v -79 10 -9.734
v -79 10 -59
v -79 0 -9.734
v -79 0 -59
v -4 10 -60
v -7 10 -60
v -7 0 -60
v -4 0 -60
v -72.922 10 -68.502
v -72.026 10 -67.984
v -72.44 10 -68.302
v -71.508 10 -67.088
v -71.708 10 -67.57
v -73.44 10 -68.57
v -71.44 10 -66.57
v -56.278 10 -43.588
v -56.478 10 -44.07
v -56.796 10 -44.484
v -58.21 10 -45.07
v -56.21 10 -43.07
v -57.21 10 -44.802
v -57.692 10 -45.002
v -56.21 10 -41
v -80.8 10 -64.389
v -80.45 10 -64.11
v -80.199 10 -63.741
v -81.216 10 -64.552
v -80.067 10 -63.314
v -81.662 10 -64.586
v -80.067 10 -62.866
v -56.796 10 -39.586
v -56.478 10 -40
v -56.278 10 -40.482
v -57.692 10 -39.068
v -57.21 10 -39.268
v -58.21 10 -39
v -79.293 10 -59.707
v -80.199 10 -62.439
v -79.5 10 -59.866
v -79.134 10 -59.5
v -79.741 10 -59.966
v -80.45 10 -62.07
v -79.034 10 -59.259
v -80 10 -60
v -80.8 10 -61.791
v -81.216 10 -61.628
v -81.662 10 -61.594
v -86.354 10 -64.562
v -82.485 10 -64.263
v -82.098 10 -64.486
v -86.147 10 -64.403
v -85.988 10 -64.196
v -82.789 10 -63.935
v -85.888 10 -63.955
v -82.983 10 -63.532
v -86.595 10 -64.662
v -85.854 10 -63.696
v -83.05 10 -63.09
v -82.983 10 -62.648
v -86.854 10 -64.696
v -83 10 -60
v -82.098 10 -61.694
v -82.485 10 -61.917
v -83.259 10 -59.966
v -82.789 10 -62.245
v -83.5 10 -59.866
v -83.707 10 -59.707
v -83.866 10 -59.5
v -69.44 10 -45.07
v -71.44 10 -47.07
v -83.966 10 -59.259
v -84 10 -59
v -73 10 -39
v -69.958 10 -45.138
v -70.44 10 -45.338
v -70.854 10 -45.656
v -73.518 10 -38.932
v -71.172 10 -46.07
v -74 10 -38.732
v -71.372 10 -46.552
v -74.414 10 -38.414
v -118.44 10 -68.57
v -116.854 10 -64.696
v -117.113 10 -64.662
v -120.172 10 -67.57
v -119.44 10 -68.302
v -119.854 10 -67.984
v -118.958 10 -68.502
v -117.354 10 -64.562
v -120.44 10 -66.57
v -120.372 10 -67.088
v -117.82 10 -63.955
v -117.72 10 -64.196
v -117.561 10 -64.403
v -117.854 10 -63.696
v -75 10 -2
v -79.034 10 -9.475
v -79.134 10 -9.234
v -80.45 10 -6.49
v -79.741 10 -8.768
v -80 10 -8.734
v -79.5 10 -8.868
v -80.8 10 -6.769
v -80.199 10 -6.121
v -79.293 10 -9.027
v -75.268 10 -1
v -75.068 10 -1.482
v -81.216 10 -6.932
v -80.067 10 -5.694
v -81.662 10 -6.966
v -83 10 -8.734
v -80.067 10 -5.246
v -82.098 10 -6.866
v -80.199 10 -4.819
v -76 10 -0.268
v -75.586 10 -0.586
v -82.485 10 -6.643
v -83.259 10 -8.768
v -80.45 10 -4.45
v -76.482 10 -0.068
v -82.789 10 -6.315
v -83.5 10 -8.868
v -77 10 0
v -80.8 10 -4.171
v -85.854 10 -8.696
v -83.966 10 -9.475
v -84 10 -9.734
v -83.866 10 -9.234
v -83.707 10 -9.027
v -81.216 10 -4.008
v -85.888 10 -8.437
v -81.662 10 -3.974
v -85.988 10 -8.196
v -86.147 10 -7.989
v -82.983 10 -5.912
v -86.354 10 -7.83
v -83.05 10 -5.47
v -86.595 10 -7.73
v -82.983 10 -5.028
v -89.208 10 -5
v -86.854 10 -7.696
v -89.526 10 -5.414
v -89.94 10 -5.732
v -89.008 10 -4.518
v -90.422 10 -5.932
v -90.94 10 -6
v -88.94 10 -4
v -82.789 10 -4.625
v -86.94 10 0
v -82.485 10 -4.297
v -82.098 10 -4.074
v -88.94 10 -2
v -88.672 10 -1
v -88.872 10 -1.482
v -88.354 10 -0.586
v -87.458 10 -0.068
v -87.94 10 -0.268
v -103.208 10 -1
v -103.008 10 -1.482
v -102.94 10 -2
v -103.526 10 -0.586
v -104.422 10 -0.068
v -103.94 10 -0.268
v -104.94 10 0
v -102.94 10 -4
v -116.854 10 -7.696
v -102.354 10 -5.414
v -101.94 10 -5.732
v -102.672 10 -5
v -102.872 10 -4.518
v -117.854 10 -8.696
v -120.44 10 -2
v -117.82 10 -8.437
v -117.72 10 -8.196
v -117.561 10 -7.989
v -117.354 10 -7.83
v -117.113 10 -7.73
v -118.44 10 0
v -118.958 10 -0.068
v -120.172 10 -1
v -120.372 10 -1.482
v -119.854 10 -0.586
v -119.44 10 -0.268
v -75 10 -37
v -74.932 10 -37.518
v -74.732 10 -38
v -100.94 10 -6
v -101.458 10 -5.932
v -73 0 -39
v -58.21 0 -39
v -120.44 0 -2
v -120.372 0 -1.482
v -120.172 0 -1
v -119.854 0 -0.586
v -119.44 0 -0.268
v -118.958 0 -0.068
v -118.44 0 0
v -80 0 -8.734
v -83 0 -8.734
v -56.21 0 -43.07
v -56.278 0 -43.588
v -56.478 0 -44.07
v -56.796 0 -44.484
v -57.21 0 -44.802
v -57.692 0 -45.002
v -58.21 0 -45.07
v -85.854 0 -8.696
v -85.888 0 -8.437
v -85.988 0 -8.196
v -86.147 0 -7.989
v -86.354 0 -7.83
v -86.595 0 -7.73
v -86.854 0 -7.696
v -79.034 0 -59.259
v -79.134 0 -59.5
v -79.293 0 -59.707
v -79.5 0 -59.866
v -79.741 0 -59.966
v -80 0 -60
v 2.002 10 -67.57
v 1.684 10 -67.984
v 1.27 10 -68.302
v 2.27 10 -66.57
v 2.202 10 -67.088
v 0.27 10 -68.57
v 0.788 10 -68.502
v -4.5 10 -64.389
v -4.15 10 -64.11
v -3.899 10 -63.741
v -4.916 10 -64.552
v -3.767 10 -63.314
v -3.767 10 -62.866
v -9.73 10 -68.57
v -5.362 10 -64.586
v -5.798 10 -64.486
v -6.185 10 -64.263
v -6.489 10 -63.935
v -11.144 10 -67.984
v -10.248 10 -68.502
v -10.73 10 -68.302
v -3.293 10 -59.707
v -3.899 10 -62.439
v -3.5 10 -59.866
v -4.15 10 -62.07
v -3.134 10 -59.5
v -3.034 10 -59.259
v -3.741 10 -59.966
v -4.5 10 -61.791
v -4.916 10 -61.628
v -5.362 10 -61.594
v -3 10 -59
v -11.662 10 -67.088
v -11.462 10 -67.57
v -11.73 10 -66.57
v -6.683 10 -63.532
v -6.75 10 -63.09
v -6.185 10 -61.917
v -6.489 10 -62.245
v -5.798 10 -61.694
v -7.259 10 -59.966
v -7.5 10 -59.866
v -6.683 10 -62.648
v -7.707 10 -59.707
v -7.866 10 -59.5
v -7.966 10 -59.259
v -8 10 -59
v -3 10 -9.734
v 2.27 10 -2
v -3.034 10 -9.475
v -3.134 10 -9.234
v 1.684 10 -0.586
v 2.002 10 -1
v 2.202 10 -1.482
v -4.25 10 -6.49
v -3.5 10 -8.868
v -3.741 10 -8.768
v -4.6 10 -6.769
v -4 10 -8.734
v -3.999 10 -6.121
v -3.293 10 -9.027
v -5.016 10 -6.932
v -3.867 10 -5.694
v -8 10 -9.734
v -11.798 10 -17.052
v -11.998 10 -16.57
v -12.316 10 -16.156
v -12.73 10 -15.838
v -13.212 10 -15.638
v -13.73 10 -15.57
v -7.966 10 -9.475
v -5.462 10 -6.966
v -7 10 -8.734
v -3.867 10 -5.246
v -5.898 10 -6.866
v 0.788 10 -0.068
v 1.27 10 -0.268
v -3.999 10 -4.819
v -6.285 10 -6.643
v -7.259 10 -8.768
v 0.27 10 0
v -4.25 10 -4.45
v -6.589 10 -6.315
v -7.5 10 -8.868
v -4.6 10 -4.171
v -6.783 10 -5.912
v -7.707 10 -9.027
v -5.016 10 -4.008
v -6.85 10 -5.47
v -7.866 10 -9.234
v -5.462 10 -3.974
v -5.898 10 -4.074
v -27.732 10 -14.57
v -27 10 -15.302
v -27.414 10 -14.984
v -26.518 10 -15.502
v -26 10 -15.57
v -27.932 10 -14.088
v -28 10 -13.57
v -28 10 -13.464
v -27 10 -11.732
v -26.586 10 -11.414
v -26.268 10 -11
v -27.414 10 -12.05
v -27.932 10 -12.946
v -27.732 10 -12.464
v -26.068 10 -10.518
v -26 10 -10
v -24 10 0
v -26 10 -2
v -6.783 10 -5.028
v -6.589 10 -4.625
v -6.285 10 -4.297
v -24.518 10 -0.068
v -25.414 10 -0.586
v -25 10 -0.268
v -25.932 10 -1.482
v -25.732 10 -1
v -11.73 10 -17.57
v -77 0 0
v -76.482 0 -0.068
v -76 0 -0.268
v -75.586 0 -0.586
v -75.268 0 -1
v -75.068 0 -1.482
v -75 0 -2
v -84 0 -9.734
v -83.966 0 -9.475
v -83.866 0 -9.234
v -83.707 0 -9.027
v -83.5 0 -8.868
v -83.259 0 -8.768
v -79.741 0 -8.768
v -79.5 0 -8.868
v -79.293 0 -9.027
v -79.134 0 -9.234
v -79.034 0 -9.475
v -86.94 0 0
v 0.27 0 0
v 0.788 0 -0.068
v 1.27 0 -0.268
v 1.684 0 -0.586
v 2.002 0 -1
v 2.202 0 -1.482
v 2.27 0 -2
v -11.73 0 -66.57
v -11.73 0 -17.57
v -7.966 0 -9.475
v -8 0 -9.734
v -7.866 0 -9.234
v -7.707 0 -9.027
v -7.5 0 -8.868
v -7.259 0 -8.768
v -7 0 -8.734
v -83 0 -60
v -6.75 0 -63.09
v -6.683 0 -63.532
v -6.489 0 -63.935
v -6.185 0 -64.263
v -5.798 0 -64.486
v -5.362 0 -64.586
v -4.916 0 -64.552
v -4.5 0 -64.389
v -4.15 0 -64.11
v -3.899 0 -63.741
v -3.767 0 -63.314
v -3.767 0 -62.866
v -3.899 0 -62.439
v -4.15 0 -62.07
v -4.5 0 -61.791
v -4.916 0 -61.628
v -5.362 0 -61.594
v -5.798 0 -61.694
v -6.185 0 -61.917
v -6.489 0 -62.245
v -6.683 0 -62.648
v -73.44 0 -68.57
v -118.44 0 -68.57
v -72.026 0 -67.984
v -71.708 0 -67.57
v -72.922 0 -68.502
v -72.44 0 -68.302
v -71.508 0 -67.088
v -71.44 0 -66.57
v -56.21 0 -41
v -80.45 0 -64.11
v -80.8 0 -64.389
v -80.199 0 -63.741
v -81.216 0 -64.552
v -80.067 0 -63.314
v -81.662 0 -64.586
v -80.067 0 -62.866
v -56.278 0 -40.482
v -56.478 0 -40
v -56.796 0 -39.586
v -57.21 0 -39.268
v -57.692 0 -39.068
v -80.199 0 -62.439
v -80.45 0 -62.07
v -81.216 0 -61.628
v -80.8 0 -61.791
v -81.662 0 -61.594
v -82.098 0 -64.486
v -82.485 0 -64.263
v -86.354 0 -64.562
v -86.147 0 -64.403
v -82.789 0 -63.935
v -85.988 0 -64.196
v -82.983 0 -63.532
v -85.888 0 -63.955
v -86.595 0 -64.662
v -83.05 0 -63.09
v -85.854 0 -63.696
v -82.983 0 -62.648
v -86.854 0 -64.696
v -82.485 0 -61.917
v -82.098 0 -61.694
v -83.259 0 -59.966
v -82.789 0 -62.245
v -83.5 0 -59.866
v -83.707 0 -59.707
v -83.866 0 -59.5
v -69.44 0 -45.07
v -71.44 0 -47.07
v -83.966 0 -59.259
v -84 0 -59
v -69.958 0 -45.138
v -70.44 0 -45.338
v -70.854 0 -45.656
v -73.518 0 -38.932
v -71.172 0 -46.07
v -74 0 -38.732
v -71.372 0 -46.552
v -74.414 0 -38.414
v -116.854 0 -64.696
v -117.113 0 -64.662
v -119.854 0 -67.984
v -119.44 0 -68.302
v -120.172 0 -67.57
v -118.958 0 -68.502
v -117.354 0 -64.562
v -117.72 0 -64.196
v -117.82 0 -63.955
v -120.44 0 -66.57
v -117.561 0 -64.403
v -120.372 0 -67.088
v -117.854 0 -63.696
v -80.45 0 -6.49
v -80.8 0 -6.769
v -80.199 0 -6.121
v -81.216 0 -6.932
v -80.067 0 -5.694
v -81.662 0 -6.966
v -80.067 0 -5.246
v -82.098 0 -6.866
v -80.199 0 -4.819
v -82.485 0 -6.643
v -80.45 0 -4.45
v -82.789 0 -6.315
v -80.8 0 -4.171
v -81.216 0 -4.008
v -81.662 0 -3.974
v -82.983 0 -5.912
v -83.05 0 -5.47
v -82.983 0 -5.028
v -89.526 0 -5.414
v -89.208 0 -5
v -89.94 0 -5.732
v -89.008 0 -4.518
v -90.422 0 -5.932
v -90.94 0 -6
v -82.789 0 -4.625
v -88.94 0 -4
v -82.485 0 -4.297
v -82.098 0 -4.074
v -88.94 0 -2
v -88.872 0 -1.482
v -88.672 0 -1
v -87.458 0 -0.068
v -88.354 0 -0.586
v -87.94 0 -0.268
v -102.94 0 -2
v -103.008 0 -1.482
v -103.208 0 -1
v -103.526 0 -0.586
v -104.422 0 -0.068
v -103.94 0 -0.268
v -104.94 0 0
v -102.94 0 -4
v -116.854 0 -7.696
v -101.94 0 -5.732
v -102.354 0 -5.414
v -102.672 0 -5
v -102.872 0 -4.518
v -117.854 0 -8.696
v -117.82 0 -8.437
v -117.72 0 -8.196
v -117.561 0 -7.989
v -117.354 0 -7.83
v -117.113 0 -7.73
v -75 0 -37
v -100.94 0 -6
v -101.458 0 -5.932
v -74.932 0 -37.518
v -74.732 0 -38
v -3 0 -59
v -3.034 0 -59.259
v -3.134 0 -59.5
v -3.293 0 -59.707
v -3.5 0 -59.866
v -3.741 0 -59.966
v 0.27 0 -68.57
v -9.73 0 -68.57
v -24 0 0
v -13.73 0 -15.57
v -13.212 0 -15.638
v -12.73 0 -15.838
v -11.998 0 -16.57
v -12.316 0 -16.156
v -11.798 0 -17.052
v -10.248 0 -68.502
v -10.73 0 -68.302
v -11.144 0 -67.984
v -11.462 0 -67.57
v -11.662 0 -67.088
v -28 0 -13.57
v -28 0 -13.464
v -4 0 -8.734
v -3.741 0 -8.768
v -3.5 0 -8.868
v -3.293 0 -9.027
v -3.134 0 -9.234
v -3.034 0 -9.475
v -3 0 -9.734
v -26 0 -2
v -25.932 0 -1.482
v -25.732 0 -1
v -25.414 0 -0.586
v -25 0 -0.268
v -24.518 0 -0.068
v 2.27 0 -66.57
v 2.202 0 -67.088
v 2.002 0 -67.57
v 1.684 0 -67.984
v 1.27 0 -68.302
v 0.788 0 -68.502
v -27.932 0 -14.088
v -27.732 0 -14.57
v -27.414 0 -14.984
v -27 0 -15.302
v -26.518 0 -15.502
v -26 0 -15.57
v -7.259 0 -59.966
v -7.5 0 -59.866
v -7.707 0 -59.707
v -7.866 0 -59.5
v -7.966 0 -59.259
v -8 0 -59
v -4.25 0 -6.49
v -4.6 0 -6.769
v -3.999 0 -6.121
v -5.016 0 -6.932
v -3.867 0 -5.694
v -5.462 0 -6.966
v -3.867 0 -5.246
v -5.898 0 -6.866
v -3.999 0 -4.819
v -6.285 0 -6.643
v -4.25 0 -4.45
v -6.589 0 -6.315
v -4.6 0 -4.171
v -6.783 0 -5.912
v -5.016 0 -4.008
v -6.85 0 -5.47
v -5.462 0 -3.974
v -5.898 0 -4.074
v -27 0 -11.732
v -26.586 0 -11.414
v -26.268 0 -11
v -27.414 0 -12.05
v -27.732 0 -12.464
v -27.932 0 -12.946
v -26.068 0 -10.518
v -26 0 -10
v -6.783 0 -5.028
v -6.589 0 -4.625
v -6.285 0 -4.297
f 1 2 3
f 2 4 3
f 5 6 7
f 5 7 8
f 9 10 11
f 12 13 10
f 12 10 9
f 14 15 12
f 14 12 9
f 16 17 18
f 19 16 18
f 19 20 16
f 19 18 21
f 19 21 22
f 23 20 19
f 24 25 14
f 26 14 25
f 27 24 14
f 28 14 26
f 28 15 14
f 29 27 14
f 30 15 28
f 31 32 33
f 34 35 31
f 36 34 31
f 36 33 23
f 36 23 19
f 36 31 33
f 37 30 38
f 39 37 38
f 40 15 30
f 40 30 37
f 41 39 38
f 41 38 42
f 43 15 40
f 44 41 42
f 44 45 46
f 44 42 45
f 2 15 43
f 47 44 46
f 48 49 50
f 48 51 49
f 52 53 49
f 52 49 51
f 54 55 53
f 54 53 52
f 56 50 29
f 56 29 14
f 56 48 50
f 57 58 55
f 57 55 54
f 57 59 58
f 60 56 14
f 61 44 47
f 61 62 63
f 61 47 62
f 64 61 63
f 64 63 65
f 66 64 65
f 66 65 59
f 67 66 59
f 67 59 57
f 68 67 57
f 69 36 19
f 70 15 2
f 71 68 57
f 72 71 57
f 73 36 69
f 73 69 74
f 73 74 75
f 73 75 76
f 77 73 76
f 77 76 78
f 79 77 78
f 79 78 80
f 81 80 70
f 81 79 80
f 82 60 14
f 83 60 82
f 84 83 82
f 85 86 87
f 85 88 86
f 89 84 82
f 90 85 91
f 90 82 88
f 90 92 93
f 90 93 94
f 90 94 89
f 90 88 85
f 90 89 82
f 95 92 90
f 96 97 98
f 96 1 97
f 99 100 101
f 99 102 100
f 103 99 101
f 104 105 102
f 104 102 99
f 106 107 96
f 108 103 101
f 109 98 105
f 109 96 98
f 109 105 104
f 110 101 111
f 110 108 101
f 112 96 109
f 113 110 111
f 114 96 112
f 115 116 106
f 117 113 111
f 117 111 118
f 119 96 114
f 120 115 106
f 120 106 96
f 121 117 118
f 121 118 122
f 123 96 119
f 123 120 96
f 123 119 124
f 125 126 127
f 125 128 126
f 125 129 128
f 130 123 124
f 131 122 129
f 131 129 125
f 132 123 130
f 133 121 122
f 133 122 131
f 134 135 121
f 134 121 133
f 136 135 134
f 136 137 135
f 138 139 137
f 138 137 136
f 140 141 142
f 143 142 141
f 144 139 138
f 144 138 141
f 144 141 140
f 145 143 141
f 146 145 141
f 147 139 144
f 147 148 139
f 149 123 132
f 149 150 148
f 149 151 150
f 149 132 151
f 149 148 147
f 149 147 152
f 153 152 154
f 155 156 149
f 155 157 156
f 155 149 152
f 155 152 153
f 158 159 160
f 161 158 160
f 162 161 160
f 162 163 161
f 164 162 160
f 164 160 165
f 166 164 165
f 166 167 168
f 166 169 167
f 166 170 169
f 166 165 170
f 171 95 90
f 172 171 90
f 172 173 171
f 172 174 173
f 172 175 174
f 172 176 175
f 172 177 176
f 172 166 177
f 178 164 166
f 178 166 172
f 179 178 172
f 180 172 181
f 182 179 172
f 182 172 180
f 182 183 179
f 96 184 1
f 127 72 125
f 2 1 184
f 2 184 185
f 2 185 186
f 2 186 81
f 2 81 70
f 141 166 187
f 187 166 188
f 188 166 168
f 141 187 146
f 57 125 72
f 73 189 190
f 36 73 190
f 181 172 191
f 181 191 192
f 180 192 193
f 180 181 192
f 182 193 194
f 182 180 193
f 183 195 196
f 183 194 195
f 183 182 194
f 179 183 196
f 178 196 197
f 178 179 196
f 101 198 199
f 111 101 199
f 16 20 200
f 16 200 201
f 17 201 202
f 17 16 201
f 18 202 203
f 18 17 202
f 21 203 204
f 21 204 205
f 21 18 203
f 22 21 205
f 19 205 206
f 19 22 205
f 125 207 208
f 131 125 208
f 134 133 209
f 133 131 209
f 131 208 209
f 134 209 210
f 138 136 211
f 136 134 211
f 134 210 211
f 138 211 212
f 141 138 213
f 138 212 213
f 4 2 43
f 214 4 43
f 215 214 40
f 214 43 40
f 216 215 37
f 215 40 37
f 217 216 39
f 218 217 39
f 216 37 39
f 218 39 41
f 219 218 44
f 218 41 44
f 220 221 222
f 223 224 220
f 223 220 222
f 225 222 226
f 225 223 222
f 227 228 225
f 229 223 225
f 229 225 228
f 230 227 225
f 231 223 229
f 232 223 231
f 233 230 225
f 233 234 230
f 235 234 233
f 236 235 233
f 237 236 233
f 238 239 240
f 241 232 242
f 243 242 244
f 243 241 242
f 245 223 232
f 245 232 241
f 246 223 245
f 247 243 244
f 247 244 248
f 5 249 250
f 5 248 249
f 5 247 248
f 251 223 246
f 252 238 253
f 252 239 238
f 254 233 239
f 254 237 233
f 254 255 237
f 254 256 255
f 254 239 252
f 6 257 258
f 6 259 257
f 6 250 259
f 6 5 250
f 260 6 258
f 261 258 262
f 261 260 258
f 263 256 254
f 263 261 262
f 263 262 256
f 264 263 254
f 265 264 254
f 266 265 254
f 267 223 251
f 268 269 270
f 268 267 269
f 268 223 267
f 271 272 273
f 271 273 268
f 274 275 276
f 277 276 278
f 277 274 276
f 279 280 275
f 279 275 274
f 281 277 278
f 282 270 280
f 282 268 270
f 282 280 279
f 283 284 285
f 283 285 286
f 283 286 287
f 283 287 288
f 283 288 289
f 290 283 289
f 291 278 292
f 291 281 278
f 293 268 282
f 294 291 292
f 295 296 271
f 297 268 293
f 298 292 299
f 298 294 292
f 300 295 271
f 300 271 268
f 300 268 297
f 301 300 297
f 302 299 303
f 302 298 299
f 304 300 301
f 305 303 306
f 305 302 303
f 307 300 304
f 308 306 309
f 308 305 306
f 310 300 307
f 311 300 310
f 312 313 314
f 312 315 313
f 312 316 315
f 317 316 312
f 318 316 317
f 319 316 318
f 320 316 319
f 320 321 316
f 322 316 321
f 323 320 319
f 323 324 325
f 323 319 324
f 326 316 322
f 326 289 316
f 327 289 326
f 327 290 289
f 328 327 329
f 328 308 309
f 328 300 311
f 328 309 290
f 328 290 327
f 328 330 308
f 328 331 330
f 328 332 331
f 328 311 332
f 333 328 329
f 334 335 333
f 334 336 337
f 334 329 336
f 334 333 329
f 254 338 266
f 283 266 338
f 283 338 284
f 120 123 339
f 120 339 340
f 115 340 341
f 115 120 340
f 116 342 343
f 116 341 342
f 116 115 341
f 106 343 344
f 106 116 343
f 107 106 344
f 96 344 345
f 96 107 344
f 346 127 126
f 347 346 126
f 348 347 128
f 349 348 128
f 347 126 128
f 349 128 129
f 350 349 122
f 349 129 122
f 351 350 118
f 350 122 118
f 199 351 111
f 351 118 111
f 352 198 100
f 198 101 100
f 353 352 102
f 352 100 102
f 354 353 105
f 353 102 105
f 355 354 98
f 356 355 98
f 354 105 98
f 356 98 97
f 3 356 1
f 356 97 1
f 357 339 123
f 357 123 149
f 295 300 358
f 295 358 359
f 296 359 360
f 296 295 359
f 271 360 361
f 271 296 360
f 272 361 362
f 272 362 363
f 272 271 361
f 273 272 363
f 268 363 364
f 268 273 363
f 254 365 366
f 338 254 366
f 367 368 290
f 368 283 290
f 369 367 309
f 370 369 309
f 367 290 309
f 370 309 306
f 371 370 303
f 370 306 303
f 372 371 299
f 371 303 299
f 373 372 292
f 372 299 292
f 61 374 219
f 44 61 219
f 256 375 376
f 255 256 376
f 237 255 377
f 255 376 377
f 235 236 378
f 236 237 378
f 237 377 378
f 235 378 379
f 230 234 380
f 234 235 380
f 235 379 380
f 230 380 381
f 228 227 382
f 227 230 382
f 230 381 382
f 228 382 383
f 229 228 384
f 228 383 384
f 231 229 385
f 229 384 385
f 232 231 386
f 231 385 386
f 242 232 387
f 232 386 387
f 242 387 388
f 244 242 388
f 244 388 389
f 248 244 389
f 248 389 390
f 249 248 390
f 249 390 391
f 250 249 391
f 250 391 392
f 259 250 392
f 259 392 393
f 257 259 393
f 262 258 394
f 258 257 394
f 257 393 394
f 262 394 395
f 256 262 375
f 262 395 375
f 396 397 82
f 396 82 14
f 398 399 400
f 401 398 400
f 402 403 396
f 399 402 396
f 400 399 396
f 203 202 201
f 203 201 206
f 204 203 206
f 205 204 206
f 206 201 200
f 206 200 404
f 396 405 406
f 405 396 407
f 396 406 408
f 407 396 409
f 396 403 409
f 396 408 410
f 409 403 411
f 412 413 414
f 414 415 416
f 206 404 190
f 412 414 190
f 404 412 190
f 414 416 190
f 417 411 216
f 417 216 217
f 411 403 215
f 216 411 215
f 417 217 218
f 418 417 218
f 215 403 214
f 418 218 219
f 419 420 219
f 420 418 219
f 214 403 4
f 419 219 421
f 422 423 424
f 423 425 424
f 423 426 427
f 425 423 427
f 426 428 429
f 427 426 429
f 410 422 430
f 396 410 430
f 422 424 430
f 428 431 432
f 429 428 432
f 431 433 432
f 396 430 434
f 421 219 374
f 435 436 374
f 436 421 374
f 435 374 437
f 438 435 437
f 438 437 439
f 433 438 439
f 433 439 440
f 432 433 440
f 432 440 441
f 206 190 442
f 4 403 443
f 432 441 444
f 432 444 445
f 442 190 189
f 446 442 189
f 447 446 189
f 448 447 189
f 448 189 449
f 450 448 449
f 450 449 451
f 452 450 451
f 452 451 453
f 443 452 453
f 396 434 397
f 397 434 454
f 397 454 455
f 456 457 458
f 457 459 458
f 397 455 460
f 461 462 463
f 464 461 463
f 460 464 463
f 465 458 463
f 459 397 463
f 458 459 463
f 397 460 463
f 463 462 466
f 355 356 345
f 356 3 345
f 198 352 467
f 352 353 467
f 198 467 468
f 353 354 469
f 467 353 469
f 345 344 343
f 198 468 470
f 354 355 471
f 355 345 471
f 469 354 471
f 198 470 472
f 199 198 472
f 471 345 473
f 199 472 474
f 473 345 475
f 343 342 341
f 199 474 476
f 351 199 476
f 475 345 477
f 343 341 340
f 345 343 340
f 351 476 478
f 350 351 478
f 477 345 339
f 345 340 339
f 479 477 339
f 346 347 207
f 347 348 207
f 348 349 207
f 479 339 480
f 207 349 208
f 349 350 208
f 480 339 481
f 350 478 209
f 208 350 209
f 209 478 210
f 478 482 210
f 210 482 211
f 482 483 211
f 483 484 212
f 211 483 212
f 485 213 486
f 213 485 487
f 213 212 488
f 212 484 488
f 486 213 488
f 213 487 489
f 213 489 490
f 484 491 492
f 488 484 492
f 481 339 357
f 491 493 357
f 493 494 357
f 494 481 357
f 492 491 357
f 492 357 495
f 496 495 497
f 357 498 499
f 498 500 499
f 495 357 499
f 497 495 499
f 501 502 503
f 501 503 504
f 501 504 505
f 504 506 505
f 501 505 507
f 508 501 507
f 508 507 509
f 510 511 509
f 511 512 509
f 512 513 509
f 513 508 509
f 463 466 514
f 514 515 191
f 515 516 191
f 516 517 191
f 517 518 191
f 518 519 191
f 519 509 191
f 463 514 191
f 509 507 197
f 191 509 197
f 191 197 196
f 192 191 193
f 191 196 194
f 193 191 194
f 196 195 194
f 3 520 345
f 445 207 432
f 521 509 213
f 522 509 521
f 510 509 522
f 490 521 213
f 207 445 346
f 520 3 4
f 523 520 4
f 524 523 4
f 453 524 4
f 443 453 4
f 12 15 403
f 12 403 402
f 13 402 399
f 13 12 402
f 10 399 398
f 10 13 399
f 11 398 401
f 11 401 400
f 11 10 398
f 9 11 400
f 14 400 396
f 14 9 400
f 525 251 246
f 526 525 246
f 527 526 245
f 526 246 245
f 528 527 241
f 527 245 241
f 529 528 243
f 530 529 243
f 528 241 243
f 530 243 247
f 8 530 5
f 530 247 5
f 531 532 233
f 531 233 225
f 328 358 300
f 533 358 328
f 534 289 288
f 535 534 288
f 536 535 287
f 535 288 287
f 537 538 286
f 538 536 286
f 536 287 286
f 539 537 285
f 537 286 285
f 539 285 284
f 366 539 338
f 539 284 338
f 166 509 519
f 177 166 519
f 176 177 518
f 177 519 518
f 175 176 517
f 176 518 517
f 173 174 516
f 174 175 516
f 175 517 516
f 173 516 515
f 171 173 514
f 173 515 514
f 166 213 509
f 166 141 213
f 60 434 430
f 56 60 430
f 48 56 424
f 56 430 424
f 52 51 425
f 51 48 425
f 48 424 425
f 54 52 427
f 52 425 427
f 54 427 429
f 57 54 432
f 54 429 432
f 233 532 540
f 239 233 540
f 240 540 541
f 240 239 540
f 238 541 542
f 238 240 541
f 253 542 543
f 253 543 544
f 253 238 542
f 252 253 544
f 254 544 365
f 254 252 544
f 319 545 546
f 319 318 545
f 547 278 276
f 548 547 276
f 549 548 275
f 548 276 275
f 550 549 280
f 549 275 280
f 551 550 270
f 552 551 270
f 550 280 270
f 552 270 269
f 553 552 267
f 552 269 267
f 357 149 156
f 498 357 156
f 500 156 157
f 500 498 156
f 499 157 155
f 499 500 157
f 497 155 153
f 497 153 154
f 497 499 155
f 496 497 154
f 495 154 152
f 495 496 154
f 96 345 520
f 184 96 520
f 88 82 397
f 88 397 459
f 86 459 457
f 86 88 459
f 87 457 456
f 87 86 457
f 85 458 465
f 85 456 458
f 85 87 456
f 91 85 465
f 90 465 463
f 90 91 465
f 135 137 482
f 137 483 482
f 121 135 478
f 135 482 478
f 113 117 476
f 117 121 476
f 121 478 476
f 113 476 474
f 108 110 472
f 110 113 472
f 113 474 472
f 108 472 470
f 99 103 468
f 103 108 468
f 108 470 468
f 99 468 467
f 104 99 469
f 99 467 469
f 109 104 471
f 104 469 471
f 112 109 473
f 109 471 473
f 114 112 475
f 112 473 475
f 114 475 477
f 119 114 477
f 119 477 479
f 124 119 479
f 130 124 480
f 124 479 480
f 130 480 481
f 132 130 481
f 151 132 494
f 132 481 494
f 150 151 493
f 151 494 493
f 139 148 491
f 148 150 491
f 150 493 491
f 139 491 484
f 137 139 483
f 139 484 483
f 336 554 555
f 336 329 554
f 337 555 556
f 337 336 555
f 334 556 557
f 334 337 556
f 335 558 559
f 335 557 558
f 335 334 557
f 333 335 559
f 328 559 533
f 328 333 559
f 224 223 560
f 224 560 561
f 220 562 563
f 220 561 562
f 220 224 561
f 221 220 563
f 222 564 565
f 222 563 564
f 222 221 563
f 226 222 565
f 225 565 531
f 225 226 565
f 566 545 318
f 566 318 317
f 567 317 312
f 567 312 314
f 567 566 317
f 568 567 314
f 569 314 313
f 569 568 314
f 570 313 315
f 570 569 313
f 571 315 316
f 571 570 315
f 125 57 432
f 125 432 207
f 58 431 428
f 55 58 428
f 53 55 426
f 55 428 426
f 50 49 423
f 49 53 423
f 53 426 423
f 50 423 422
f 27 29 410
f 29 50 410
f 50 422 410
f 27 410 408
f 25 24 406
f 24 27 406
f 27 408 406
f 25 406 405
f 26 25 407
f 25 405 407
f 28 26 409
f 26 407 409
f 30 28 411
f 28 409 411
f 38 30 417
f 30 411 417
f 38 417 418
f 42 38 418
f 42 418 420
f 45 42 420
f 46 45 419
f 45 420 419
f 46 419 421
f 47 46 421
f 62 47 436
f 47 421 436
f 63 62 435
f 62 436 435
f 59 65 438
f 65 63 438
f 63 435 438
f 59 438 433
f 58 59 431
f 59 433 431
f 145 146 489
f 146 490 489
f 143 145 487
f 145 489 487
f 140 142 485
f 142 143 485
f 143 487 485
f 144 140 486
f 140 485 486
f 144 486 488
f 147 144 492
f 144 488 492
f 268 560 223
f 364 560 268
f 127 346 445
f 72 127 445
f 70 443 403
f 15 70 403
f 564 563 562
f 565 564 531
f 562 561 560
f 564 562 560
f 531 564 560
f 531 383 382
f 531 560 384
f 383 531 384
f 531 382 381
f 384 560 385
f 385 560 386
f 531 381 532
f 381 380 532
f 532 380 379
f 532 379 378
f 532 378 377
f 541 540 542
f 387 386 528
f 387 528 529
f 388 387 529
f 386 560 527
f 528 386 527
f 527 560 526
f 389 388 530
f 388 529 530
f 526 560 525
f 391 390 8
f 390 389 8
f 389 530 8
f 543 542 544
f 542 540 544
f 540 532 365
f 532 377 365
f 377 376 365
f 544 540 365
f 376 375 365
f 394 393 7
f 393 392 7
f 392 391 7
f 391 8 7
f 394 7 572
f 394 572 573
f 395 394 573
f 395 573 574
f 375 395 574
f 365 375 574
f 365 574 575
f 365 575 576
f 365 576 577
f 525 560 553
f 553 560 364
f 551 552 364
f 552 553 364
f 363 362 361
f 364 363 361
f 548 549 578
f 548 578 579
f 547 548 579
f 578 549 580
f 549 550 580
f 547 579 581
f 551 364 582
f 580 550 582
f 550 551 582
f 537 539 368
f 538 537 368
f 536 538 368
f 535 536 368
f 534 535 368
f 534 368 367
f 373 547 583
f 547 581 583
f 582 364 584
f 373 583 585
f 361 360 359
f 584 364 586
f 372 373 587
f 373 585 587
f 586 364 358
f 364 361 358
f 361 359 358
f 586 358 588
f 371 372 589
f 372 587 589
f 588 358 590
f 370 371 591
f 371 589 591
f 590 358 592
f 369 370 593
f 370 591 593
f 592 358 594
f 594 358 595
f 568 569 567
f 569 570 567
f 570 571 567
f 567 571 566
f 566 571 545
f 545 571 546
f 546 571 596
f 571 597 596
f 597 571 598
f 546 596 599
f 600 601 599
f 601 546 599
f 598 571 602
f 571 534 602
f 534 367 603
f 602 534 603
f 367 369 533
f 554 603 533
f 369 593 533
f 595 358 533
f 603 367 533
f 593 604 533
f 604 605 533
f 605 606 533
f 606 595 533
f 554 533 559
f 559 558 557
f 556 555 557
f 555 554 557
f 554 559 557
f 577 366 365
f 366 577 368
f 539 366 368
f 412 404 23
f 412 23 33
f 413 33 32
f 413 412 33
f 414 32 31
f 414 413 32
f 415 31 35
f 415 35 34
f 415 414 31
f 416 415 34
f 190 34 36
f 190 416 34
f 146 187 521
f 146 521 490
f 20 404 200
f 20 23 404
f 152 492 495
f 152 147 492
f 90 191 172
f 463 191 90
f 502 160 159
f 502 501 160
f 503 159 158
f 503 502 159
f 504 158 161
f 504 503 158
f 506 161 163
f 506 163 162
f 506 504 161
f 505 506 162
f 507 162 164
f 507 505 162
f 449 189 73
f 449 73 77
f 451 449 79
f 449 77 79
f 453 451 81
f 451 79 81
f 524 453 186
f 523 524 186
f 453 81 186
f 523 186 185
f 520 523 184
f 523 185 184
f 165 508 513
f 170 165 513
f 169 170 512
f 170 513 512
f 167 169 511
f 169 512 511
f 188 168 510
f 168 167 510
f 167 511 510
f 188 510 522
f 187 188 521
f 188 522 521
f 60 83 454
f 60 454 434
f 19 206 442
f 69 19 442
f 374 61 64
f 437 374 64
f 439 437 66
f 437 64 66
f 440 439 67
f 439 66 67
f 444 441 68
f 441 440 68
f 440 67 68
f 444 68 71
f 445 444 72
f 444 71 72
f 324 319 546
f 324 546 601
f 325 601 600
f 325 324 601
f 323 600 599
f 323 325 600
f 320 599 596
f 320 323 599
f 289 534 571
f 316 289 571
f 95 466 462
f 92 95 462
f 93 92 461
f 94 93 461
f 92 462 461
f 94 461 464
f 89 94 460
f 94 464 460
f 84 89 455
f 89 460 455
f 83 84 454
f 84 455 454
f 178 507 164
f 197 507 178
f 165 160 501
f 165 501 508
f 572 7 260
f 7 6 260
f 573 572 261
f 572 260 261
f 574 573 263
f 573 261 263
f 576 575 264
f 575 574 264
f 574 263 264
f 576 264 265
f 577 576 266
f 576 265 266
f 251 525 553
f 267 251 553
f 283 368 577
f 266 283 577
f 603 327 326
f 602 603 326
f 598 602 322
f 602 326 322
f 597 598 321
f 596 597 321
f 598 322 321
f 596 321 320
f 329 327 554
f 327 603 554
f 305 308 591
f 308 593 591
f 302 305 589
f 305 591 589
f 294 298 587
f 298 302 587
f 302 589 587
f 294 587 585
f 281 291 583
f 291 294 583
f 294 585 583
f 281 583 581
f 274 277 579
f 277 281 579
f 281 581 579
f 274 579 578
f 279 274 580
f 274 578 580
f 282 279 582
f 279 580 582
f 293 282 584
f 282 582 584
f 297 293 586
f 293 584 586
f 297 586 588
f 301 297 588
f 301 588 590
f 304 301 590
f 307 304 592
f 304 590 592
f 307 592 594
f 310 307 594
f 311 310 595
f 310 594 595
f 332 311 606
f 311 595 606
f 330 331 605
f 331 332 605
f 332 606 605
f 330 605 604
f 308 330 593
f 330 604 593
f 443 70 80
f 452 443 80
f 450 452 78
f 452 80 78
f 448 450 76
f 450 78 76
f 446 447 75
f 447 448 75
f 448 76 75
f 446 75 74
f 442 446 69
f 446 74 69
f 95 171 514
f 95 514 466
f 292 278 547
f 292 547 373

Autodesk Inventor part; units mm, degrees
ref_plane "YZ Plane" through (0, 0, 0) normal (1, 0, 0) x (0, 1, 0)
ref_plane "XZ Plane" through (0, 0, 0) normal (0, 1, 0) x (-1, 0, 0)
ref_plane "XY Plane" through (0, 0, 0) normal (0, 0, 1) x (1, 0, 0)
sketch "Sketch1" plane through (0, 0, 0) normal (0, 1, 0) x (-1, 0, 0)
  line L0 (-2.27, 0) -> (120.44, 0)
  line L1 (120.44, 0) -> (120.44, -68.57)
  line L2 (120.44, -68.57) -> (-2.27, -68.57)
  line L3 (-2.27, -68.57) -> (-2.27, 0)
  line L4 (120.44, -66.57) -> (120.44, -2)
  line L5 (0, -68.57) -> (118.44, -68.57)
  line L6 (-2.27, -2.27) -> (-2.27, -66.3)
  circle A0 centre (81.55, -63.09) radius 1.5
  circle A1 centre (81.55, -63.09) radius 1.5
  line L7 (71.44, -68.57) -> (11.73, -68.57)
  line L8 (11.73, -68.57) -> (11.73, -45.07)
  line L9 (11.73, -45.07) -> (71.44, -45.07)
  line L10 (71.44, -45.07) -> (71.44, -68.57)
  line L11 (75, -39) -> (51, -39)
  line L12 (51, -39) -> (51, 0)
  line L13 (51, 0) -> (75, 0)
  line L14 (75, 0) -> (75, -39)
  line L15 (51, -12) -> (26, -12)
  line L16 (26, -12) -> (26, 0)
  line L17 (26, 0) -> (51, 0)
  line L18 (51, 0) -> (51, -12)
  line L19 (11.73, -15.57) -> (42, -15.57)
  line L20 (84, -60) -> (79, -60)
  line L21 (79, -60) -> (79, -8.7337)
  line L22 (79, -8.7337) -> (84, -8.7337)
  line L23 (84, -8.7337) -> (84, -60)
  line L24 (8, -60) -> (3, -60)
  line L25 (3, -60) -> (3, -8.7337)
  line L26 (3, -8.7337) -> (8, -8.7337)
  line L27 (8, -8.7337) -> (8, -60)
  circle A2 centre (5.25, -63.09) radius 1.5
  circle A3 centre (5.35, -5.47) radius 1.5
  circle A4 centre (81.55, -5.47) radius 1.5
  circle A5 centre (81.55, -5.47) radius 1.5
  circle A6 centre (5.35, -5.47) radius 1.5
  circle A7 centre (5.25, -63.09) radius 1.5
  line L28 (42, -15.57) -> (42, -44)
  line L29 (42, -44) -> (11.73, -44)
  line L30 (11.73, -44) -> (11.73, -15.57)
  dimension "d20" = 3
  dimension "d21" = 14
  dimension "d22" = 49
  dimension "d23" = 12
  dimension "d24" = 30.27
  dimension "d25" = 24
  dimension "d26" = 39
  dimension "d27" = 3
  dimension "d28" = 3
  dimension "d29" = 3
  dimension "d30" = 68.57
  dimension "d31" = 23.5
  dimension "d32" = 28.43
  dimension "d33" = 30.27
  dimension "d72" = 122.71
extrude "Extrusion1" add sketch "Sketch1" along normal blind 10 contours L0 L16 L15 L12 L11 L14 L1 L2 L10 L9 L8 L3
fillet "Fillet4" radius 2 4 edges at (-120.44, 5, -68.57) (-120.44, 5, 0) (2.27, 5, -68.57) (2.27, 5, 0)
fillet "Fillet5" radius 2 14 edges at (-71.44, 5, -68.57) (-71.44, 5, -45.07) (-11.73, 5, -68.57) (-11.73, 5, -45.07) (-11.73, 5, -44) (-11.73, 5, -15.57) (-42, 5, -15.57) (-42, 5, -44) (-26, 5, -12) (-51, 5, -12) (-26, 5, 0) (-51, 5, -39) (-75, 5, -39) (-75, 5, 0)
fillet "Fillet6" radius 1 8 edges at (-8, 5, -8.7337) (-3, 5, -8.7337) (-3, 5, -60) (-8, 5, -60) (-79, 5, -8.7337) (-84, 5, -8.7337) (-84, 5, -60) (-79, 5, -60)
sketch "Sketch2" plane through (0, 10, 0) normal (0, 1, 0) x (1, 0, 0)
  line L0 (-25.1876, 48.0097) -> (-22.3279, 48.0097) construction
  line L1 (-22.3279, 48.0097) -> (-22.3279, 44.9597) construction
  line L2 (-22.3279, 44.9597) -> (-25.1876, 44.9597) construction
  line L3 (-25.1876, 44.9597) -> (-25.1876, 48.0097) construction
  line L4 (-62.9206, 48.3158) -> (-61.8687, 48.3158) construction
  line L5 (-61.8687, 48.3158) -> (-61.8687, 45.2658) construction
  line L6 (-61.8687, 45.2658) -> (-62.9206, 45.2658) construction
  line L7 (-62.9206, 45.2658) -> (-62.9206, 48.3158) construction
  line L8 (-43.4013, 48.199) -> (-40.5416, 48.199) construction
  line L9 (-40.5416, 48.199) -> (-40.5416, 45.149) construction
  line L10 (-40.5416, 45.149) -> (-43.4013, 45.149) construction
  line L11 (-43.4013, 45.149) -> (-43.4013, 48.199) construction
  point P0 (0, 0)
emboss "Emboss1" [suppressed]
sketch "Sketch3" plane through (0, 10, 0) normal (0, 1, 0) x (1, 0, 0)
  line L0 (-118.44, 0) -> (-77, 0) projected
  line L1 (-88.94, 0) -> (-102.94, 0)
  line L2 (-102.94, 0) -> (-102.94, 6)
  line L3 (-102.94, 6) -> (-88.94, 6)
  line L4 (-88.94, 6) -> (-88.94, 0)
  line L5 (-120.44, 66.57) -> (-120.44, 2) projected
  point P0 (0, 0)
  point P1 (-102.94, 0)
  dimension "d39" = 17.5
  dimension "d40" = 6
  dimension "d43" = 14
extrude "Extrusion2" cut sketch "Sketch3" against normal blind 10
fillet "Fillet7" radius 2 4 edges at (-88.94, 5, 0) (-88.94, 5, -6) (-102.94, 5, -6) (-102.94, 5, 0)
sketch "Sketch4" plane through (0, 10, 0) normal (0, 1, 0) x (1, 0, 0)
  circle A0 centre (-91.14, 23.07) radius 1.25
  circle A1 centre (-91.14, 50.07) radius 1.25
  circle A2 centre (-113.14, 36.57) radius 1.25
  line L0 (-73.44, 68.57) -> (-118.44, 68.57) projected
  line L1 (-120.44, 66.57) -> (-120.44, 2) projected
  point P0 (0, 0)
  dimension "d45" = 27
  dimension "d46" = 22
  dimension "d47" = 2.5
  dimension "d48" = 2.5
  dimension "d49" = 2.5
  dimension "d50" = 22
  dimension "d51" = 13.5
  dimension "d52" = 18.5
  dimension "d53" = 7.3
extrude "Extrusion3" cut sketch "Sketch4" against normal blind 10
sketch "Sketch5" plane through (0, 10, 0) normal (0, 1, 0) x (1, 0, 0)
  circle A0 centre (-113.14, 36.57) radius 1.25 projected
  line L0 (-115.4494, 36.57) -> (-114.2947, 38.57)
  line L1 (-114.2947, 38.57) -> (-111.9853, 38.57)
  line L2 (-111.9853, 38.57) -> (-110.8306, 36.57)
  line L3 (-110.8306, 36.57) -> (-111.9853, 34.57)
  line L4 (-111.9853, 34.57) -> (-114.2947, 34.57)
  line L5 (-114.2947, 34.57) -> (-115.4494, 36.57)
  circle A1 centre (-91.14, 23.07) radius 1.25 projected
  line L6 (-93.4494, 23.07) -> (-92.2947, 25.07)
  line L7 (-92.2947, 25.07) -> (-89.9853, 25.07)
  line L8 (-89.9853, 25.07) -> (-88.8306, 23.07)
  line L9 (-88.8306, 23.07) -> (-89.9853, 21.07)
  line L10 (-89.9853, 21.07) -> (-92.2947, 21.07)
  line L11 (-92.2947, 21.07) -> (-93.4494, 23.07)
  circle A2 centre (-91.14, 50.07) radius 1.25 projected
  line L12 (-93.4494, 50.07) -> (-92.2947, 52.07)
  line L13 (-92.2947, 52.07) -> (-89.9853, 52.07)
  line L14 (-89.9853, 52.07) -> (-88.8306, 50.07)
  line L15 (-88.8306, 50.07) -> (-89.9853, 48.07)
  line L16 (-89.9853, 48.07) -> (-92.2947, 48.07)
  line L17 (-92.2947, 48.07) -> (-93.4494, 50.07)
  point P0 (0, 0)
  dimension "d56" = 4
  dimension "d57" = 4
  dimension "d58" = 4
extrude "Extrusion4" cut sketch "Sketch5" against normal blind 10
sketch "Sketch6" plane through (0, 10, 0) normal (0, 1, 0) x (1, 0, 0)
  circle A0 centre (-5.35, 5.47) radius 1.5 projected
  line L0 (-7.9481, 5.47) -> (-6.649, 7.72)
  line L1 (-6.649, 7.72) -> (-4.051, 7.72)
  line L2 (-4.051, 7.72) -> (-2.7519, 5.47)
  line L3 (-2.7519, 5.47) -> (-4.051, 3.22)
  line L4 (-4.051, 3.22) -> (-6.649, 3.22)
  line L5 (-6.649, 3.22) -> (-7.9481, 5.47)
  circle A1 centre (-5.25, 63.09) radius 1.5 projected
  line L6 (-7.8481, 63.09) -> (-6.549, 65.34)
  line L7 (-6.549, 65.34) -> (-3.951, 65.34)
  line L8 (-3.951, 65.34) -> (-2.6519, 63.09)
  line L9 (-2.6519, 63.09) -> (-3.951, 60.84)
  line L10 (-3.951, 60.84) -> (-6.549, 60.84)
  line L11 (-6.549, 60.84) -> (-7.8481, 63.09)
  circle A2 centre (-81.55, 63.09) radius 1.5 projected
  line L12 (-84.1481, 63.09) -> (-82.849, 65.34)
  line L13 (-82.849, 65.34) -> (-80.251, 65.34)
  line L14 (-80.251, 65.34) -> (-78.9519, 63.09)
  line L15 (-78.9519, 63.09) -> (-80.251, 60.84)
  line L16 (-80.251, 60.84) -> (-82.849, 60.84)
  line L17 (-82.849, 60.84) -> (-84.1481, 63.09)
  circle A3 centre (-81.55, 5.47) radius 1.5 projected
  line L18 (-82.849, 7.72) -> (-80.251, 7.72)
  line L19 (-80.251, 7.72) -> (-78.9519, 5.47)
  line L20 (-78.9519, 5.47) -> (-80.251, 3.22)
  line L21 (-80.251, 3.22) -> (-82.849, 3.22)
  line L22 (-82.849, 3.22) -> (-84.1481, 5.47)
  line L23 (-84.1481, 5.47) -> (-82.849, 7.72)
  line L24 (-86.94, 0) -> (-77, 0) projected
  point P0 (0, 0)
  dimension "d61" = 4.5
  dimension "d62" = 4.5
  dimension "d63" = 4.5
  dimension "d64" = 4.5
extrude "Extrusion5" [suppressed]
sketch "Sketch7" plane through (0, 10, 0) normal (0, 1, 0) x (1, 0, 0)
  line L0 (-117.8537, 64.6958) -> (-85.8537, 64.6958)
  line L1 (-85.8537, 64.6958) -> (-85.8537, 7.6958)
  line L2 (-85.8537, 7.6958) -> (-117.8537, 7.6958)
  line L3 (-117.8537, 7.6958) -> (-117.8537, 64.6958)
  point P0 (0, 0)
  dimension "d67" = 57
  dimension "d68" = 32
extrude "Extrusion6" cut sketch "Sketch7" against normal blind 10
fillet "Fillet8" radius 1 4 edges at (-117.8537, 5, -64.6958) (-85.8537, 5, -64.6958) (-85.8537, 5, -7.6958) (-117.8537, 5, -7.6958)
sketch "Sketch8" plane through (0, 10, 0) normal (0, 1, 0) x (1, 0, 0)
  arc A0 (-42, 17.57) -> (-40, 15.57) centre (-40, 17.57) ccw projected
  line L0 (-28, 12) -> (-40, 12)
  line L1 (-40, 12) -> (-40, 15.57)
  line L2 (-40, 15.57) -> (-28, 15.57)
  line L3 (-28, 15.57) -> (-28, 12)
  point P0 (0, 0)
extrude "Extrusion7" cut sketch "Sketch8" against normal blind 10
fillet "Fillet9" radius 2 4 edges at (-28, 5, -15.57) (-28, 5, -12) (-40, 5, -12) (-40, 5, -15.57)
sketch "Sketch9" plane through (0, 10, 0) normal (0, 1, 0) x (1, 0, 0)
  line L0 (-11.73, 42) -> (-11.73, 17.57) projected
  line L1 (-11.73, 18.1739) -> (-56.2098, 18.1739)
  line L2 (-56.2098, 18.1739) -> (-56.2098, 49.7949)
  line L3 (-56.2098, 49.7949) -> (-11.73, 49.7949)
  line L4 (-11.73, 49.7949) -> (-11.73, 18.1739)
  point P0 (0, 0)
extrude "Extrusion8" cut sketch "Sketch9" against normal blind 10
fillet "Fillet10" radius 2 2 edges at (-42, 5, -18.1739) (-56.2098, 5, -45.07)
sketch "Sketch10" plane through (0, 10, 0) normal (0, 1, 0) x (1, 0, 0)
  line L0 (-33, 5) -> (-66, 5)
  line L1 (-66, 5) -> (-66, 23)
  line L2 (-66, 23) -> (-33, 23)
  line L3 (-33, 23) -> (-33, 5)
  point P0 (0, 0)
extrude "Extrusion9" cut sketch "Sketch10" against normal blind 10
fillet "Fillet12" radius 2 1 edges at (-56.2098, 5, -39)
properties part number "Bottom PMMA"
